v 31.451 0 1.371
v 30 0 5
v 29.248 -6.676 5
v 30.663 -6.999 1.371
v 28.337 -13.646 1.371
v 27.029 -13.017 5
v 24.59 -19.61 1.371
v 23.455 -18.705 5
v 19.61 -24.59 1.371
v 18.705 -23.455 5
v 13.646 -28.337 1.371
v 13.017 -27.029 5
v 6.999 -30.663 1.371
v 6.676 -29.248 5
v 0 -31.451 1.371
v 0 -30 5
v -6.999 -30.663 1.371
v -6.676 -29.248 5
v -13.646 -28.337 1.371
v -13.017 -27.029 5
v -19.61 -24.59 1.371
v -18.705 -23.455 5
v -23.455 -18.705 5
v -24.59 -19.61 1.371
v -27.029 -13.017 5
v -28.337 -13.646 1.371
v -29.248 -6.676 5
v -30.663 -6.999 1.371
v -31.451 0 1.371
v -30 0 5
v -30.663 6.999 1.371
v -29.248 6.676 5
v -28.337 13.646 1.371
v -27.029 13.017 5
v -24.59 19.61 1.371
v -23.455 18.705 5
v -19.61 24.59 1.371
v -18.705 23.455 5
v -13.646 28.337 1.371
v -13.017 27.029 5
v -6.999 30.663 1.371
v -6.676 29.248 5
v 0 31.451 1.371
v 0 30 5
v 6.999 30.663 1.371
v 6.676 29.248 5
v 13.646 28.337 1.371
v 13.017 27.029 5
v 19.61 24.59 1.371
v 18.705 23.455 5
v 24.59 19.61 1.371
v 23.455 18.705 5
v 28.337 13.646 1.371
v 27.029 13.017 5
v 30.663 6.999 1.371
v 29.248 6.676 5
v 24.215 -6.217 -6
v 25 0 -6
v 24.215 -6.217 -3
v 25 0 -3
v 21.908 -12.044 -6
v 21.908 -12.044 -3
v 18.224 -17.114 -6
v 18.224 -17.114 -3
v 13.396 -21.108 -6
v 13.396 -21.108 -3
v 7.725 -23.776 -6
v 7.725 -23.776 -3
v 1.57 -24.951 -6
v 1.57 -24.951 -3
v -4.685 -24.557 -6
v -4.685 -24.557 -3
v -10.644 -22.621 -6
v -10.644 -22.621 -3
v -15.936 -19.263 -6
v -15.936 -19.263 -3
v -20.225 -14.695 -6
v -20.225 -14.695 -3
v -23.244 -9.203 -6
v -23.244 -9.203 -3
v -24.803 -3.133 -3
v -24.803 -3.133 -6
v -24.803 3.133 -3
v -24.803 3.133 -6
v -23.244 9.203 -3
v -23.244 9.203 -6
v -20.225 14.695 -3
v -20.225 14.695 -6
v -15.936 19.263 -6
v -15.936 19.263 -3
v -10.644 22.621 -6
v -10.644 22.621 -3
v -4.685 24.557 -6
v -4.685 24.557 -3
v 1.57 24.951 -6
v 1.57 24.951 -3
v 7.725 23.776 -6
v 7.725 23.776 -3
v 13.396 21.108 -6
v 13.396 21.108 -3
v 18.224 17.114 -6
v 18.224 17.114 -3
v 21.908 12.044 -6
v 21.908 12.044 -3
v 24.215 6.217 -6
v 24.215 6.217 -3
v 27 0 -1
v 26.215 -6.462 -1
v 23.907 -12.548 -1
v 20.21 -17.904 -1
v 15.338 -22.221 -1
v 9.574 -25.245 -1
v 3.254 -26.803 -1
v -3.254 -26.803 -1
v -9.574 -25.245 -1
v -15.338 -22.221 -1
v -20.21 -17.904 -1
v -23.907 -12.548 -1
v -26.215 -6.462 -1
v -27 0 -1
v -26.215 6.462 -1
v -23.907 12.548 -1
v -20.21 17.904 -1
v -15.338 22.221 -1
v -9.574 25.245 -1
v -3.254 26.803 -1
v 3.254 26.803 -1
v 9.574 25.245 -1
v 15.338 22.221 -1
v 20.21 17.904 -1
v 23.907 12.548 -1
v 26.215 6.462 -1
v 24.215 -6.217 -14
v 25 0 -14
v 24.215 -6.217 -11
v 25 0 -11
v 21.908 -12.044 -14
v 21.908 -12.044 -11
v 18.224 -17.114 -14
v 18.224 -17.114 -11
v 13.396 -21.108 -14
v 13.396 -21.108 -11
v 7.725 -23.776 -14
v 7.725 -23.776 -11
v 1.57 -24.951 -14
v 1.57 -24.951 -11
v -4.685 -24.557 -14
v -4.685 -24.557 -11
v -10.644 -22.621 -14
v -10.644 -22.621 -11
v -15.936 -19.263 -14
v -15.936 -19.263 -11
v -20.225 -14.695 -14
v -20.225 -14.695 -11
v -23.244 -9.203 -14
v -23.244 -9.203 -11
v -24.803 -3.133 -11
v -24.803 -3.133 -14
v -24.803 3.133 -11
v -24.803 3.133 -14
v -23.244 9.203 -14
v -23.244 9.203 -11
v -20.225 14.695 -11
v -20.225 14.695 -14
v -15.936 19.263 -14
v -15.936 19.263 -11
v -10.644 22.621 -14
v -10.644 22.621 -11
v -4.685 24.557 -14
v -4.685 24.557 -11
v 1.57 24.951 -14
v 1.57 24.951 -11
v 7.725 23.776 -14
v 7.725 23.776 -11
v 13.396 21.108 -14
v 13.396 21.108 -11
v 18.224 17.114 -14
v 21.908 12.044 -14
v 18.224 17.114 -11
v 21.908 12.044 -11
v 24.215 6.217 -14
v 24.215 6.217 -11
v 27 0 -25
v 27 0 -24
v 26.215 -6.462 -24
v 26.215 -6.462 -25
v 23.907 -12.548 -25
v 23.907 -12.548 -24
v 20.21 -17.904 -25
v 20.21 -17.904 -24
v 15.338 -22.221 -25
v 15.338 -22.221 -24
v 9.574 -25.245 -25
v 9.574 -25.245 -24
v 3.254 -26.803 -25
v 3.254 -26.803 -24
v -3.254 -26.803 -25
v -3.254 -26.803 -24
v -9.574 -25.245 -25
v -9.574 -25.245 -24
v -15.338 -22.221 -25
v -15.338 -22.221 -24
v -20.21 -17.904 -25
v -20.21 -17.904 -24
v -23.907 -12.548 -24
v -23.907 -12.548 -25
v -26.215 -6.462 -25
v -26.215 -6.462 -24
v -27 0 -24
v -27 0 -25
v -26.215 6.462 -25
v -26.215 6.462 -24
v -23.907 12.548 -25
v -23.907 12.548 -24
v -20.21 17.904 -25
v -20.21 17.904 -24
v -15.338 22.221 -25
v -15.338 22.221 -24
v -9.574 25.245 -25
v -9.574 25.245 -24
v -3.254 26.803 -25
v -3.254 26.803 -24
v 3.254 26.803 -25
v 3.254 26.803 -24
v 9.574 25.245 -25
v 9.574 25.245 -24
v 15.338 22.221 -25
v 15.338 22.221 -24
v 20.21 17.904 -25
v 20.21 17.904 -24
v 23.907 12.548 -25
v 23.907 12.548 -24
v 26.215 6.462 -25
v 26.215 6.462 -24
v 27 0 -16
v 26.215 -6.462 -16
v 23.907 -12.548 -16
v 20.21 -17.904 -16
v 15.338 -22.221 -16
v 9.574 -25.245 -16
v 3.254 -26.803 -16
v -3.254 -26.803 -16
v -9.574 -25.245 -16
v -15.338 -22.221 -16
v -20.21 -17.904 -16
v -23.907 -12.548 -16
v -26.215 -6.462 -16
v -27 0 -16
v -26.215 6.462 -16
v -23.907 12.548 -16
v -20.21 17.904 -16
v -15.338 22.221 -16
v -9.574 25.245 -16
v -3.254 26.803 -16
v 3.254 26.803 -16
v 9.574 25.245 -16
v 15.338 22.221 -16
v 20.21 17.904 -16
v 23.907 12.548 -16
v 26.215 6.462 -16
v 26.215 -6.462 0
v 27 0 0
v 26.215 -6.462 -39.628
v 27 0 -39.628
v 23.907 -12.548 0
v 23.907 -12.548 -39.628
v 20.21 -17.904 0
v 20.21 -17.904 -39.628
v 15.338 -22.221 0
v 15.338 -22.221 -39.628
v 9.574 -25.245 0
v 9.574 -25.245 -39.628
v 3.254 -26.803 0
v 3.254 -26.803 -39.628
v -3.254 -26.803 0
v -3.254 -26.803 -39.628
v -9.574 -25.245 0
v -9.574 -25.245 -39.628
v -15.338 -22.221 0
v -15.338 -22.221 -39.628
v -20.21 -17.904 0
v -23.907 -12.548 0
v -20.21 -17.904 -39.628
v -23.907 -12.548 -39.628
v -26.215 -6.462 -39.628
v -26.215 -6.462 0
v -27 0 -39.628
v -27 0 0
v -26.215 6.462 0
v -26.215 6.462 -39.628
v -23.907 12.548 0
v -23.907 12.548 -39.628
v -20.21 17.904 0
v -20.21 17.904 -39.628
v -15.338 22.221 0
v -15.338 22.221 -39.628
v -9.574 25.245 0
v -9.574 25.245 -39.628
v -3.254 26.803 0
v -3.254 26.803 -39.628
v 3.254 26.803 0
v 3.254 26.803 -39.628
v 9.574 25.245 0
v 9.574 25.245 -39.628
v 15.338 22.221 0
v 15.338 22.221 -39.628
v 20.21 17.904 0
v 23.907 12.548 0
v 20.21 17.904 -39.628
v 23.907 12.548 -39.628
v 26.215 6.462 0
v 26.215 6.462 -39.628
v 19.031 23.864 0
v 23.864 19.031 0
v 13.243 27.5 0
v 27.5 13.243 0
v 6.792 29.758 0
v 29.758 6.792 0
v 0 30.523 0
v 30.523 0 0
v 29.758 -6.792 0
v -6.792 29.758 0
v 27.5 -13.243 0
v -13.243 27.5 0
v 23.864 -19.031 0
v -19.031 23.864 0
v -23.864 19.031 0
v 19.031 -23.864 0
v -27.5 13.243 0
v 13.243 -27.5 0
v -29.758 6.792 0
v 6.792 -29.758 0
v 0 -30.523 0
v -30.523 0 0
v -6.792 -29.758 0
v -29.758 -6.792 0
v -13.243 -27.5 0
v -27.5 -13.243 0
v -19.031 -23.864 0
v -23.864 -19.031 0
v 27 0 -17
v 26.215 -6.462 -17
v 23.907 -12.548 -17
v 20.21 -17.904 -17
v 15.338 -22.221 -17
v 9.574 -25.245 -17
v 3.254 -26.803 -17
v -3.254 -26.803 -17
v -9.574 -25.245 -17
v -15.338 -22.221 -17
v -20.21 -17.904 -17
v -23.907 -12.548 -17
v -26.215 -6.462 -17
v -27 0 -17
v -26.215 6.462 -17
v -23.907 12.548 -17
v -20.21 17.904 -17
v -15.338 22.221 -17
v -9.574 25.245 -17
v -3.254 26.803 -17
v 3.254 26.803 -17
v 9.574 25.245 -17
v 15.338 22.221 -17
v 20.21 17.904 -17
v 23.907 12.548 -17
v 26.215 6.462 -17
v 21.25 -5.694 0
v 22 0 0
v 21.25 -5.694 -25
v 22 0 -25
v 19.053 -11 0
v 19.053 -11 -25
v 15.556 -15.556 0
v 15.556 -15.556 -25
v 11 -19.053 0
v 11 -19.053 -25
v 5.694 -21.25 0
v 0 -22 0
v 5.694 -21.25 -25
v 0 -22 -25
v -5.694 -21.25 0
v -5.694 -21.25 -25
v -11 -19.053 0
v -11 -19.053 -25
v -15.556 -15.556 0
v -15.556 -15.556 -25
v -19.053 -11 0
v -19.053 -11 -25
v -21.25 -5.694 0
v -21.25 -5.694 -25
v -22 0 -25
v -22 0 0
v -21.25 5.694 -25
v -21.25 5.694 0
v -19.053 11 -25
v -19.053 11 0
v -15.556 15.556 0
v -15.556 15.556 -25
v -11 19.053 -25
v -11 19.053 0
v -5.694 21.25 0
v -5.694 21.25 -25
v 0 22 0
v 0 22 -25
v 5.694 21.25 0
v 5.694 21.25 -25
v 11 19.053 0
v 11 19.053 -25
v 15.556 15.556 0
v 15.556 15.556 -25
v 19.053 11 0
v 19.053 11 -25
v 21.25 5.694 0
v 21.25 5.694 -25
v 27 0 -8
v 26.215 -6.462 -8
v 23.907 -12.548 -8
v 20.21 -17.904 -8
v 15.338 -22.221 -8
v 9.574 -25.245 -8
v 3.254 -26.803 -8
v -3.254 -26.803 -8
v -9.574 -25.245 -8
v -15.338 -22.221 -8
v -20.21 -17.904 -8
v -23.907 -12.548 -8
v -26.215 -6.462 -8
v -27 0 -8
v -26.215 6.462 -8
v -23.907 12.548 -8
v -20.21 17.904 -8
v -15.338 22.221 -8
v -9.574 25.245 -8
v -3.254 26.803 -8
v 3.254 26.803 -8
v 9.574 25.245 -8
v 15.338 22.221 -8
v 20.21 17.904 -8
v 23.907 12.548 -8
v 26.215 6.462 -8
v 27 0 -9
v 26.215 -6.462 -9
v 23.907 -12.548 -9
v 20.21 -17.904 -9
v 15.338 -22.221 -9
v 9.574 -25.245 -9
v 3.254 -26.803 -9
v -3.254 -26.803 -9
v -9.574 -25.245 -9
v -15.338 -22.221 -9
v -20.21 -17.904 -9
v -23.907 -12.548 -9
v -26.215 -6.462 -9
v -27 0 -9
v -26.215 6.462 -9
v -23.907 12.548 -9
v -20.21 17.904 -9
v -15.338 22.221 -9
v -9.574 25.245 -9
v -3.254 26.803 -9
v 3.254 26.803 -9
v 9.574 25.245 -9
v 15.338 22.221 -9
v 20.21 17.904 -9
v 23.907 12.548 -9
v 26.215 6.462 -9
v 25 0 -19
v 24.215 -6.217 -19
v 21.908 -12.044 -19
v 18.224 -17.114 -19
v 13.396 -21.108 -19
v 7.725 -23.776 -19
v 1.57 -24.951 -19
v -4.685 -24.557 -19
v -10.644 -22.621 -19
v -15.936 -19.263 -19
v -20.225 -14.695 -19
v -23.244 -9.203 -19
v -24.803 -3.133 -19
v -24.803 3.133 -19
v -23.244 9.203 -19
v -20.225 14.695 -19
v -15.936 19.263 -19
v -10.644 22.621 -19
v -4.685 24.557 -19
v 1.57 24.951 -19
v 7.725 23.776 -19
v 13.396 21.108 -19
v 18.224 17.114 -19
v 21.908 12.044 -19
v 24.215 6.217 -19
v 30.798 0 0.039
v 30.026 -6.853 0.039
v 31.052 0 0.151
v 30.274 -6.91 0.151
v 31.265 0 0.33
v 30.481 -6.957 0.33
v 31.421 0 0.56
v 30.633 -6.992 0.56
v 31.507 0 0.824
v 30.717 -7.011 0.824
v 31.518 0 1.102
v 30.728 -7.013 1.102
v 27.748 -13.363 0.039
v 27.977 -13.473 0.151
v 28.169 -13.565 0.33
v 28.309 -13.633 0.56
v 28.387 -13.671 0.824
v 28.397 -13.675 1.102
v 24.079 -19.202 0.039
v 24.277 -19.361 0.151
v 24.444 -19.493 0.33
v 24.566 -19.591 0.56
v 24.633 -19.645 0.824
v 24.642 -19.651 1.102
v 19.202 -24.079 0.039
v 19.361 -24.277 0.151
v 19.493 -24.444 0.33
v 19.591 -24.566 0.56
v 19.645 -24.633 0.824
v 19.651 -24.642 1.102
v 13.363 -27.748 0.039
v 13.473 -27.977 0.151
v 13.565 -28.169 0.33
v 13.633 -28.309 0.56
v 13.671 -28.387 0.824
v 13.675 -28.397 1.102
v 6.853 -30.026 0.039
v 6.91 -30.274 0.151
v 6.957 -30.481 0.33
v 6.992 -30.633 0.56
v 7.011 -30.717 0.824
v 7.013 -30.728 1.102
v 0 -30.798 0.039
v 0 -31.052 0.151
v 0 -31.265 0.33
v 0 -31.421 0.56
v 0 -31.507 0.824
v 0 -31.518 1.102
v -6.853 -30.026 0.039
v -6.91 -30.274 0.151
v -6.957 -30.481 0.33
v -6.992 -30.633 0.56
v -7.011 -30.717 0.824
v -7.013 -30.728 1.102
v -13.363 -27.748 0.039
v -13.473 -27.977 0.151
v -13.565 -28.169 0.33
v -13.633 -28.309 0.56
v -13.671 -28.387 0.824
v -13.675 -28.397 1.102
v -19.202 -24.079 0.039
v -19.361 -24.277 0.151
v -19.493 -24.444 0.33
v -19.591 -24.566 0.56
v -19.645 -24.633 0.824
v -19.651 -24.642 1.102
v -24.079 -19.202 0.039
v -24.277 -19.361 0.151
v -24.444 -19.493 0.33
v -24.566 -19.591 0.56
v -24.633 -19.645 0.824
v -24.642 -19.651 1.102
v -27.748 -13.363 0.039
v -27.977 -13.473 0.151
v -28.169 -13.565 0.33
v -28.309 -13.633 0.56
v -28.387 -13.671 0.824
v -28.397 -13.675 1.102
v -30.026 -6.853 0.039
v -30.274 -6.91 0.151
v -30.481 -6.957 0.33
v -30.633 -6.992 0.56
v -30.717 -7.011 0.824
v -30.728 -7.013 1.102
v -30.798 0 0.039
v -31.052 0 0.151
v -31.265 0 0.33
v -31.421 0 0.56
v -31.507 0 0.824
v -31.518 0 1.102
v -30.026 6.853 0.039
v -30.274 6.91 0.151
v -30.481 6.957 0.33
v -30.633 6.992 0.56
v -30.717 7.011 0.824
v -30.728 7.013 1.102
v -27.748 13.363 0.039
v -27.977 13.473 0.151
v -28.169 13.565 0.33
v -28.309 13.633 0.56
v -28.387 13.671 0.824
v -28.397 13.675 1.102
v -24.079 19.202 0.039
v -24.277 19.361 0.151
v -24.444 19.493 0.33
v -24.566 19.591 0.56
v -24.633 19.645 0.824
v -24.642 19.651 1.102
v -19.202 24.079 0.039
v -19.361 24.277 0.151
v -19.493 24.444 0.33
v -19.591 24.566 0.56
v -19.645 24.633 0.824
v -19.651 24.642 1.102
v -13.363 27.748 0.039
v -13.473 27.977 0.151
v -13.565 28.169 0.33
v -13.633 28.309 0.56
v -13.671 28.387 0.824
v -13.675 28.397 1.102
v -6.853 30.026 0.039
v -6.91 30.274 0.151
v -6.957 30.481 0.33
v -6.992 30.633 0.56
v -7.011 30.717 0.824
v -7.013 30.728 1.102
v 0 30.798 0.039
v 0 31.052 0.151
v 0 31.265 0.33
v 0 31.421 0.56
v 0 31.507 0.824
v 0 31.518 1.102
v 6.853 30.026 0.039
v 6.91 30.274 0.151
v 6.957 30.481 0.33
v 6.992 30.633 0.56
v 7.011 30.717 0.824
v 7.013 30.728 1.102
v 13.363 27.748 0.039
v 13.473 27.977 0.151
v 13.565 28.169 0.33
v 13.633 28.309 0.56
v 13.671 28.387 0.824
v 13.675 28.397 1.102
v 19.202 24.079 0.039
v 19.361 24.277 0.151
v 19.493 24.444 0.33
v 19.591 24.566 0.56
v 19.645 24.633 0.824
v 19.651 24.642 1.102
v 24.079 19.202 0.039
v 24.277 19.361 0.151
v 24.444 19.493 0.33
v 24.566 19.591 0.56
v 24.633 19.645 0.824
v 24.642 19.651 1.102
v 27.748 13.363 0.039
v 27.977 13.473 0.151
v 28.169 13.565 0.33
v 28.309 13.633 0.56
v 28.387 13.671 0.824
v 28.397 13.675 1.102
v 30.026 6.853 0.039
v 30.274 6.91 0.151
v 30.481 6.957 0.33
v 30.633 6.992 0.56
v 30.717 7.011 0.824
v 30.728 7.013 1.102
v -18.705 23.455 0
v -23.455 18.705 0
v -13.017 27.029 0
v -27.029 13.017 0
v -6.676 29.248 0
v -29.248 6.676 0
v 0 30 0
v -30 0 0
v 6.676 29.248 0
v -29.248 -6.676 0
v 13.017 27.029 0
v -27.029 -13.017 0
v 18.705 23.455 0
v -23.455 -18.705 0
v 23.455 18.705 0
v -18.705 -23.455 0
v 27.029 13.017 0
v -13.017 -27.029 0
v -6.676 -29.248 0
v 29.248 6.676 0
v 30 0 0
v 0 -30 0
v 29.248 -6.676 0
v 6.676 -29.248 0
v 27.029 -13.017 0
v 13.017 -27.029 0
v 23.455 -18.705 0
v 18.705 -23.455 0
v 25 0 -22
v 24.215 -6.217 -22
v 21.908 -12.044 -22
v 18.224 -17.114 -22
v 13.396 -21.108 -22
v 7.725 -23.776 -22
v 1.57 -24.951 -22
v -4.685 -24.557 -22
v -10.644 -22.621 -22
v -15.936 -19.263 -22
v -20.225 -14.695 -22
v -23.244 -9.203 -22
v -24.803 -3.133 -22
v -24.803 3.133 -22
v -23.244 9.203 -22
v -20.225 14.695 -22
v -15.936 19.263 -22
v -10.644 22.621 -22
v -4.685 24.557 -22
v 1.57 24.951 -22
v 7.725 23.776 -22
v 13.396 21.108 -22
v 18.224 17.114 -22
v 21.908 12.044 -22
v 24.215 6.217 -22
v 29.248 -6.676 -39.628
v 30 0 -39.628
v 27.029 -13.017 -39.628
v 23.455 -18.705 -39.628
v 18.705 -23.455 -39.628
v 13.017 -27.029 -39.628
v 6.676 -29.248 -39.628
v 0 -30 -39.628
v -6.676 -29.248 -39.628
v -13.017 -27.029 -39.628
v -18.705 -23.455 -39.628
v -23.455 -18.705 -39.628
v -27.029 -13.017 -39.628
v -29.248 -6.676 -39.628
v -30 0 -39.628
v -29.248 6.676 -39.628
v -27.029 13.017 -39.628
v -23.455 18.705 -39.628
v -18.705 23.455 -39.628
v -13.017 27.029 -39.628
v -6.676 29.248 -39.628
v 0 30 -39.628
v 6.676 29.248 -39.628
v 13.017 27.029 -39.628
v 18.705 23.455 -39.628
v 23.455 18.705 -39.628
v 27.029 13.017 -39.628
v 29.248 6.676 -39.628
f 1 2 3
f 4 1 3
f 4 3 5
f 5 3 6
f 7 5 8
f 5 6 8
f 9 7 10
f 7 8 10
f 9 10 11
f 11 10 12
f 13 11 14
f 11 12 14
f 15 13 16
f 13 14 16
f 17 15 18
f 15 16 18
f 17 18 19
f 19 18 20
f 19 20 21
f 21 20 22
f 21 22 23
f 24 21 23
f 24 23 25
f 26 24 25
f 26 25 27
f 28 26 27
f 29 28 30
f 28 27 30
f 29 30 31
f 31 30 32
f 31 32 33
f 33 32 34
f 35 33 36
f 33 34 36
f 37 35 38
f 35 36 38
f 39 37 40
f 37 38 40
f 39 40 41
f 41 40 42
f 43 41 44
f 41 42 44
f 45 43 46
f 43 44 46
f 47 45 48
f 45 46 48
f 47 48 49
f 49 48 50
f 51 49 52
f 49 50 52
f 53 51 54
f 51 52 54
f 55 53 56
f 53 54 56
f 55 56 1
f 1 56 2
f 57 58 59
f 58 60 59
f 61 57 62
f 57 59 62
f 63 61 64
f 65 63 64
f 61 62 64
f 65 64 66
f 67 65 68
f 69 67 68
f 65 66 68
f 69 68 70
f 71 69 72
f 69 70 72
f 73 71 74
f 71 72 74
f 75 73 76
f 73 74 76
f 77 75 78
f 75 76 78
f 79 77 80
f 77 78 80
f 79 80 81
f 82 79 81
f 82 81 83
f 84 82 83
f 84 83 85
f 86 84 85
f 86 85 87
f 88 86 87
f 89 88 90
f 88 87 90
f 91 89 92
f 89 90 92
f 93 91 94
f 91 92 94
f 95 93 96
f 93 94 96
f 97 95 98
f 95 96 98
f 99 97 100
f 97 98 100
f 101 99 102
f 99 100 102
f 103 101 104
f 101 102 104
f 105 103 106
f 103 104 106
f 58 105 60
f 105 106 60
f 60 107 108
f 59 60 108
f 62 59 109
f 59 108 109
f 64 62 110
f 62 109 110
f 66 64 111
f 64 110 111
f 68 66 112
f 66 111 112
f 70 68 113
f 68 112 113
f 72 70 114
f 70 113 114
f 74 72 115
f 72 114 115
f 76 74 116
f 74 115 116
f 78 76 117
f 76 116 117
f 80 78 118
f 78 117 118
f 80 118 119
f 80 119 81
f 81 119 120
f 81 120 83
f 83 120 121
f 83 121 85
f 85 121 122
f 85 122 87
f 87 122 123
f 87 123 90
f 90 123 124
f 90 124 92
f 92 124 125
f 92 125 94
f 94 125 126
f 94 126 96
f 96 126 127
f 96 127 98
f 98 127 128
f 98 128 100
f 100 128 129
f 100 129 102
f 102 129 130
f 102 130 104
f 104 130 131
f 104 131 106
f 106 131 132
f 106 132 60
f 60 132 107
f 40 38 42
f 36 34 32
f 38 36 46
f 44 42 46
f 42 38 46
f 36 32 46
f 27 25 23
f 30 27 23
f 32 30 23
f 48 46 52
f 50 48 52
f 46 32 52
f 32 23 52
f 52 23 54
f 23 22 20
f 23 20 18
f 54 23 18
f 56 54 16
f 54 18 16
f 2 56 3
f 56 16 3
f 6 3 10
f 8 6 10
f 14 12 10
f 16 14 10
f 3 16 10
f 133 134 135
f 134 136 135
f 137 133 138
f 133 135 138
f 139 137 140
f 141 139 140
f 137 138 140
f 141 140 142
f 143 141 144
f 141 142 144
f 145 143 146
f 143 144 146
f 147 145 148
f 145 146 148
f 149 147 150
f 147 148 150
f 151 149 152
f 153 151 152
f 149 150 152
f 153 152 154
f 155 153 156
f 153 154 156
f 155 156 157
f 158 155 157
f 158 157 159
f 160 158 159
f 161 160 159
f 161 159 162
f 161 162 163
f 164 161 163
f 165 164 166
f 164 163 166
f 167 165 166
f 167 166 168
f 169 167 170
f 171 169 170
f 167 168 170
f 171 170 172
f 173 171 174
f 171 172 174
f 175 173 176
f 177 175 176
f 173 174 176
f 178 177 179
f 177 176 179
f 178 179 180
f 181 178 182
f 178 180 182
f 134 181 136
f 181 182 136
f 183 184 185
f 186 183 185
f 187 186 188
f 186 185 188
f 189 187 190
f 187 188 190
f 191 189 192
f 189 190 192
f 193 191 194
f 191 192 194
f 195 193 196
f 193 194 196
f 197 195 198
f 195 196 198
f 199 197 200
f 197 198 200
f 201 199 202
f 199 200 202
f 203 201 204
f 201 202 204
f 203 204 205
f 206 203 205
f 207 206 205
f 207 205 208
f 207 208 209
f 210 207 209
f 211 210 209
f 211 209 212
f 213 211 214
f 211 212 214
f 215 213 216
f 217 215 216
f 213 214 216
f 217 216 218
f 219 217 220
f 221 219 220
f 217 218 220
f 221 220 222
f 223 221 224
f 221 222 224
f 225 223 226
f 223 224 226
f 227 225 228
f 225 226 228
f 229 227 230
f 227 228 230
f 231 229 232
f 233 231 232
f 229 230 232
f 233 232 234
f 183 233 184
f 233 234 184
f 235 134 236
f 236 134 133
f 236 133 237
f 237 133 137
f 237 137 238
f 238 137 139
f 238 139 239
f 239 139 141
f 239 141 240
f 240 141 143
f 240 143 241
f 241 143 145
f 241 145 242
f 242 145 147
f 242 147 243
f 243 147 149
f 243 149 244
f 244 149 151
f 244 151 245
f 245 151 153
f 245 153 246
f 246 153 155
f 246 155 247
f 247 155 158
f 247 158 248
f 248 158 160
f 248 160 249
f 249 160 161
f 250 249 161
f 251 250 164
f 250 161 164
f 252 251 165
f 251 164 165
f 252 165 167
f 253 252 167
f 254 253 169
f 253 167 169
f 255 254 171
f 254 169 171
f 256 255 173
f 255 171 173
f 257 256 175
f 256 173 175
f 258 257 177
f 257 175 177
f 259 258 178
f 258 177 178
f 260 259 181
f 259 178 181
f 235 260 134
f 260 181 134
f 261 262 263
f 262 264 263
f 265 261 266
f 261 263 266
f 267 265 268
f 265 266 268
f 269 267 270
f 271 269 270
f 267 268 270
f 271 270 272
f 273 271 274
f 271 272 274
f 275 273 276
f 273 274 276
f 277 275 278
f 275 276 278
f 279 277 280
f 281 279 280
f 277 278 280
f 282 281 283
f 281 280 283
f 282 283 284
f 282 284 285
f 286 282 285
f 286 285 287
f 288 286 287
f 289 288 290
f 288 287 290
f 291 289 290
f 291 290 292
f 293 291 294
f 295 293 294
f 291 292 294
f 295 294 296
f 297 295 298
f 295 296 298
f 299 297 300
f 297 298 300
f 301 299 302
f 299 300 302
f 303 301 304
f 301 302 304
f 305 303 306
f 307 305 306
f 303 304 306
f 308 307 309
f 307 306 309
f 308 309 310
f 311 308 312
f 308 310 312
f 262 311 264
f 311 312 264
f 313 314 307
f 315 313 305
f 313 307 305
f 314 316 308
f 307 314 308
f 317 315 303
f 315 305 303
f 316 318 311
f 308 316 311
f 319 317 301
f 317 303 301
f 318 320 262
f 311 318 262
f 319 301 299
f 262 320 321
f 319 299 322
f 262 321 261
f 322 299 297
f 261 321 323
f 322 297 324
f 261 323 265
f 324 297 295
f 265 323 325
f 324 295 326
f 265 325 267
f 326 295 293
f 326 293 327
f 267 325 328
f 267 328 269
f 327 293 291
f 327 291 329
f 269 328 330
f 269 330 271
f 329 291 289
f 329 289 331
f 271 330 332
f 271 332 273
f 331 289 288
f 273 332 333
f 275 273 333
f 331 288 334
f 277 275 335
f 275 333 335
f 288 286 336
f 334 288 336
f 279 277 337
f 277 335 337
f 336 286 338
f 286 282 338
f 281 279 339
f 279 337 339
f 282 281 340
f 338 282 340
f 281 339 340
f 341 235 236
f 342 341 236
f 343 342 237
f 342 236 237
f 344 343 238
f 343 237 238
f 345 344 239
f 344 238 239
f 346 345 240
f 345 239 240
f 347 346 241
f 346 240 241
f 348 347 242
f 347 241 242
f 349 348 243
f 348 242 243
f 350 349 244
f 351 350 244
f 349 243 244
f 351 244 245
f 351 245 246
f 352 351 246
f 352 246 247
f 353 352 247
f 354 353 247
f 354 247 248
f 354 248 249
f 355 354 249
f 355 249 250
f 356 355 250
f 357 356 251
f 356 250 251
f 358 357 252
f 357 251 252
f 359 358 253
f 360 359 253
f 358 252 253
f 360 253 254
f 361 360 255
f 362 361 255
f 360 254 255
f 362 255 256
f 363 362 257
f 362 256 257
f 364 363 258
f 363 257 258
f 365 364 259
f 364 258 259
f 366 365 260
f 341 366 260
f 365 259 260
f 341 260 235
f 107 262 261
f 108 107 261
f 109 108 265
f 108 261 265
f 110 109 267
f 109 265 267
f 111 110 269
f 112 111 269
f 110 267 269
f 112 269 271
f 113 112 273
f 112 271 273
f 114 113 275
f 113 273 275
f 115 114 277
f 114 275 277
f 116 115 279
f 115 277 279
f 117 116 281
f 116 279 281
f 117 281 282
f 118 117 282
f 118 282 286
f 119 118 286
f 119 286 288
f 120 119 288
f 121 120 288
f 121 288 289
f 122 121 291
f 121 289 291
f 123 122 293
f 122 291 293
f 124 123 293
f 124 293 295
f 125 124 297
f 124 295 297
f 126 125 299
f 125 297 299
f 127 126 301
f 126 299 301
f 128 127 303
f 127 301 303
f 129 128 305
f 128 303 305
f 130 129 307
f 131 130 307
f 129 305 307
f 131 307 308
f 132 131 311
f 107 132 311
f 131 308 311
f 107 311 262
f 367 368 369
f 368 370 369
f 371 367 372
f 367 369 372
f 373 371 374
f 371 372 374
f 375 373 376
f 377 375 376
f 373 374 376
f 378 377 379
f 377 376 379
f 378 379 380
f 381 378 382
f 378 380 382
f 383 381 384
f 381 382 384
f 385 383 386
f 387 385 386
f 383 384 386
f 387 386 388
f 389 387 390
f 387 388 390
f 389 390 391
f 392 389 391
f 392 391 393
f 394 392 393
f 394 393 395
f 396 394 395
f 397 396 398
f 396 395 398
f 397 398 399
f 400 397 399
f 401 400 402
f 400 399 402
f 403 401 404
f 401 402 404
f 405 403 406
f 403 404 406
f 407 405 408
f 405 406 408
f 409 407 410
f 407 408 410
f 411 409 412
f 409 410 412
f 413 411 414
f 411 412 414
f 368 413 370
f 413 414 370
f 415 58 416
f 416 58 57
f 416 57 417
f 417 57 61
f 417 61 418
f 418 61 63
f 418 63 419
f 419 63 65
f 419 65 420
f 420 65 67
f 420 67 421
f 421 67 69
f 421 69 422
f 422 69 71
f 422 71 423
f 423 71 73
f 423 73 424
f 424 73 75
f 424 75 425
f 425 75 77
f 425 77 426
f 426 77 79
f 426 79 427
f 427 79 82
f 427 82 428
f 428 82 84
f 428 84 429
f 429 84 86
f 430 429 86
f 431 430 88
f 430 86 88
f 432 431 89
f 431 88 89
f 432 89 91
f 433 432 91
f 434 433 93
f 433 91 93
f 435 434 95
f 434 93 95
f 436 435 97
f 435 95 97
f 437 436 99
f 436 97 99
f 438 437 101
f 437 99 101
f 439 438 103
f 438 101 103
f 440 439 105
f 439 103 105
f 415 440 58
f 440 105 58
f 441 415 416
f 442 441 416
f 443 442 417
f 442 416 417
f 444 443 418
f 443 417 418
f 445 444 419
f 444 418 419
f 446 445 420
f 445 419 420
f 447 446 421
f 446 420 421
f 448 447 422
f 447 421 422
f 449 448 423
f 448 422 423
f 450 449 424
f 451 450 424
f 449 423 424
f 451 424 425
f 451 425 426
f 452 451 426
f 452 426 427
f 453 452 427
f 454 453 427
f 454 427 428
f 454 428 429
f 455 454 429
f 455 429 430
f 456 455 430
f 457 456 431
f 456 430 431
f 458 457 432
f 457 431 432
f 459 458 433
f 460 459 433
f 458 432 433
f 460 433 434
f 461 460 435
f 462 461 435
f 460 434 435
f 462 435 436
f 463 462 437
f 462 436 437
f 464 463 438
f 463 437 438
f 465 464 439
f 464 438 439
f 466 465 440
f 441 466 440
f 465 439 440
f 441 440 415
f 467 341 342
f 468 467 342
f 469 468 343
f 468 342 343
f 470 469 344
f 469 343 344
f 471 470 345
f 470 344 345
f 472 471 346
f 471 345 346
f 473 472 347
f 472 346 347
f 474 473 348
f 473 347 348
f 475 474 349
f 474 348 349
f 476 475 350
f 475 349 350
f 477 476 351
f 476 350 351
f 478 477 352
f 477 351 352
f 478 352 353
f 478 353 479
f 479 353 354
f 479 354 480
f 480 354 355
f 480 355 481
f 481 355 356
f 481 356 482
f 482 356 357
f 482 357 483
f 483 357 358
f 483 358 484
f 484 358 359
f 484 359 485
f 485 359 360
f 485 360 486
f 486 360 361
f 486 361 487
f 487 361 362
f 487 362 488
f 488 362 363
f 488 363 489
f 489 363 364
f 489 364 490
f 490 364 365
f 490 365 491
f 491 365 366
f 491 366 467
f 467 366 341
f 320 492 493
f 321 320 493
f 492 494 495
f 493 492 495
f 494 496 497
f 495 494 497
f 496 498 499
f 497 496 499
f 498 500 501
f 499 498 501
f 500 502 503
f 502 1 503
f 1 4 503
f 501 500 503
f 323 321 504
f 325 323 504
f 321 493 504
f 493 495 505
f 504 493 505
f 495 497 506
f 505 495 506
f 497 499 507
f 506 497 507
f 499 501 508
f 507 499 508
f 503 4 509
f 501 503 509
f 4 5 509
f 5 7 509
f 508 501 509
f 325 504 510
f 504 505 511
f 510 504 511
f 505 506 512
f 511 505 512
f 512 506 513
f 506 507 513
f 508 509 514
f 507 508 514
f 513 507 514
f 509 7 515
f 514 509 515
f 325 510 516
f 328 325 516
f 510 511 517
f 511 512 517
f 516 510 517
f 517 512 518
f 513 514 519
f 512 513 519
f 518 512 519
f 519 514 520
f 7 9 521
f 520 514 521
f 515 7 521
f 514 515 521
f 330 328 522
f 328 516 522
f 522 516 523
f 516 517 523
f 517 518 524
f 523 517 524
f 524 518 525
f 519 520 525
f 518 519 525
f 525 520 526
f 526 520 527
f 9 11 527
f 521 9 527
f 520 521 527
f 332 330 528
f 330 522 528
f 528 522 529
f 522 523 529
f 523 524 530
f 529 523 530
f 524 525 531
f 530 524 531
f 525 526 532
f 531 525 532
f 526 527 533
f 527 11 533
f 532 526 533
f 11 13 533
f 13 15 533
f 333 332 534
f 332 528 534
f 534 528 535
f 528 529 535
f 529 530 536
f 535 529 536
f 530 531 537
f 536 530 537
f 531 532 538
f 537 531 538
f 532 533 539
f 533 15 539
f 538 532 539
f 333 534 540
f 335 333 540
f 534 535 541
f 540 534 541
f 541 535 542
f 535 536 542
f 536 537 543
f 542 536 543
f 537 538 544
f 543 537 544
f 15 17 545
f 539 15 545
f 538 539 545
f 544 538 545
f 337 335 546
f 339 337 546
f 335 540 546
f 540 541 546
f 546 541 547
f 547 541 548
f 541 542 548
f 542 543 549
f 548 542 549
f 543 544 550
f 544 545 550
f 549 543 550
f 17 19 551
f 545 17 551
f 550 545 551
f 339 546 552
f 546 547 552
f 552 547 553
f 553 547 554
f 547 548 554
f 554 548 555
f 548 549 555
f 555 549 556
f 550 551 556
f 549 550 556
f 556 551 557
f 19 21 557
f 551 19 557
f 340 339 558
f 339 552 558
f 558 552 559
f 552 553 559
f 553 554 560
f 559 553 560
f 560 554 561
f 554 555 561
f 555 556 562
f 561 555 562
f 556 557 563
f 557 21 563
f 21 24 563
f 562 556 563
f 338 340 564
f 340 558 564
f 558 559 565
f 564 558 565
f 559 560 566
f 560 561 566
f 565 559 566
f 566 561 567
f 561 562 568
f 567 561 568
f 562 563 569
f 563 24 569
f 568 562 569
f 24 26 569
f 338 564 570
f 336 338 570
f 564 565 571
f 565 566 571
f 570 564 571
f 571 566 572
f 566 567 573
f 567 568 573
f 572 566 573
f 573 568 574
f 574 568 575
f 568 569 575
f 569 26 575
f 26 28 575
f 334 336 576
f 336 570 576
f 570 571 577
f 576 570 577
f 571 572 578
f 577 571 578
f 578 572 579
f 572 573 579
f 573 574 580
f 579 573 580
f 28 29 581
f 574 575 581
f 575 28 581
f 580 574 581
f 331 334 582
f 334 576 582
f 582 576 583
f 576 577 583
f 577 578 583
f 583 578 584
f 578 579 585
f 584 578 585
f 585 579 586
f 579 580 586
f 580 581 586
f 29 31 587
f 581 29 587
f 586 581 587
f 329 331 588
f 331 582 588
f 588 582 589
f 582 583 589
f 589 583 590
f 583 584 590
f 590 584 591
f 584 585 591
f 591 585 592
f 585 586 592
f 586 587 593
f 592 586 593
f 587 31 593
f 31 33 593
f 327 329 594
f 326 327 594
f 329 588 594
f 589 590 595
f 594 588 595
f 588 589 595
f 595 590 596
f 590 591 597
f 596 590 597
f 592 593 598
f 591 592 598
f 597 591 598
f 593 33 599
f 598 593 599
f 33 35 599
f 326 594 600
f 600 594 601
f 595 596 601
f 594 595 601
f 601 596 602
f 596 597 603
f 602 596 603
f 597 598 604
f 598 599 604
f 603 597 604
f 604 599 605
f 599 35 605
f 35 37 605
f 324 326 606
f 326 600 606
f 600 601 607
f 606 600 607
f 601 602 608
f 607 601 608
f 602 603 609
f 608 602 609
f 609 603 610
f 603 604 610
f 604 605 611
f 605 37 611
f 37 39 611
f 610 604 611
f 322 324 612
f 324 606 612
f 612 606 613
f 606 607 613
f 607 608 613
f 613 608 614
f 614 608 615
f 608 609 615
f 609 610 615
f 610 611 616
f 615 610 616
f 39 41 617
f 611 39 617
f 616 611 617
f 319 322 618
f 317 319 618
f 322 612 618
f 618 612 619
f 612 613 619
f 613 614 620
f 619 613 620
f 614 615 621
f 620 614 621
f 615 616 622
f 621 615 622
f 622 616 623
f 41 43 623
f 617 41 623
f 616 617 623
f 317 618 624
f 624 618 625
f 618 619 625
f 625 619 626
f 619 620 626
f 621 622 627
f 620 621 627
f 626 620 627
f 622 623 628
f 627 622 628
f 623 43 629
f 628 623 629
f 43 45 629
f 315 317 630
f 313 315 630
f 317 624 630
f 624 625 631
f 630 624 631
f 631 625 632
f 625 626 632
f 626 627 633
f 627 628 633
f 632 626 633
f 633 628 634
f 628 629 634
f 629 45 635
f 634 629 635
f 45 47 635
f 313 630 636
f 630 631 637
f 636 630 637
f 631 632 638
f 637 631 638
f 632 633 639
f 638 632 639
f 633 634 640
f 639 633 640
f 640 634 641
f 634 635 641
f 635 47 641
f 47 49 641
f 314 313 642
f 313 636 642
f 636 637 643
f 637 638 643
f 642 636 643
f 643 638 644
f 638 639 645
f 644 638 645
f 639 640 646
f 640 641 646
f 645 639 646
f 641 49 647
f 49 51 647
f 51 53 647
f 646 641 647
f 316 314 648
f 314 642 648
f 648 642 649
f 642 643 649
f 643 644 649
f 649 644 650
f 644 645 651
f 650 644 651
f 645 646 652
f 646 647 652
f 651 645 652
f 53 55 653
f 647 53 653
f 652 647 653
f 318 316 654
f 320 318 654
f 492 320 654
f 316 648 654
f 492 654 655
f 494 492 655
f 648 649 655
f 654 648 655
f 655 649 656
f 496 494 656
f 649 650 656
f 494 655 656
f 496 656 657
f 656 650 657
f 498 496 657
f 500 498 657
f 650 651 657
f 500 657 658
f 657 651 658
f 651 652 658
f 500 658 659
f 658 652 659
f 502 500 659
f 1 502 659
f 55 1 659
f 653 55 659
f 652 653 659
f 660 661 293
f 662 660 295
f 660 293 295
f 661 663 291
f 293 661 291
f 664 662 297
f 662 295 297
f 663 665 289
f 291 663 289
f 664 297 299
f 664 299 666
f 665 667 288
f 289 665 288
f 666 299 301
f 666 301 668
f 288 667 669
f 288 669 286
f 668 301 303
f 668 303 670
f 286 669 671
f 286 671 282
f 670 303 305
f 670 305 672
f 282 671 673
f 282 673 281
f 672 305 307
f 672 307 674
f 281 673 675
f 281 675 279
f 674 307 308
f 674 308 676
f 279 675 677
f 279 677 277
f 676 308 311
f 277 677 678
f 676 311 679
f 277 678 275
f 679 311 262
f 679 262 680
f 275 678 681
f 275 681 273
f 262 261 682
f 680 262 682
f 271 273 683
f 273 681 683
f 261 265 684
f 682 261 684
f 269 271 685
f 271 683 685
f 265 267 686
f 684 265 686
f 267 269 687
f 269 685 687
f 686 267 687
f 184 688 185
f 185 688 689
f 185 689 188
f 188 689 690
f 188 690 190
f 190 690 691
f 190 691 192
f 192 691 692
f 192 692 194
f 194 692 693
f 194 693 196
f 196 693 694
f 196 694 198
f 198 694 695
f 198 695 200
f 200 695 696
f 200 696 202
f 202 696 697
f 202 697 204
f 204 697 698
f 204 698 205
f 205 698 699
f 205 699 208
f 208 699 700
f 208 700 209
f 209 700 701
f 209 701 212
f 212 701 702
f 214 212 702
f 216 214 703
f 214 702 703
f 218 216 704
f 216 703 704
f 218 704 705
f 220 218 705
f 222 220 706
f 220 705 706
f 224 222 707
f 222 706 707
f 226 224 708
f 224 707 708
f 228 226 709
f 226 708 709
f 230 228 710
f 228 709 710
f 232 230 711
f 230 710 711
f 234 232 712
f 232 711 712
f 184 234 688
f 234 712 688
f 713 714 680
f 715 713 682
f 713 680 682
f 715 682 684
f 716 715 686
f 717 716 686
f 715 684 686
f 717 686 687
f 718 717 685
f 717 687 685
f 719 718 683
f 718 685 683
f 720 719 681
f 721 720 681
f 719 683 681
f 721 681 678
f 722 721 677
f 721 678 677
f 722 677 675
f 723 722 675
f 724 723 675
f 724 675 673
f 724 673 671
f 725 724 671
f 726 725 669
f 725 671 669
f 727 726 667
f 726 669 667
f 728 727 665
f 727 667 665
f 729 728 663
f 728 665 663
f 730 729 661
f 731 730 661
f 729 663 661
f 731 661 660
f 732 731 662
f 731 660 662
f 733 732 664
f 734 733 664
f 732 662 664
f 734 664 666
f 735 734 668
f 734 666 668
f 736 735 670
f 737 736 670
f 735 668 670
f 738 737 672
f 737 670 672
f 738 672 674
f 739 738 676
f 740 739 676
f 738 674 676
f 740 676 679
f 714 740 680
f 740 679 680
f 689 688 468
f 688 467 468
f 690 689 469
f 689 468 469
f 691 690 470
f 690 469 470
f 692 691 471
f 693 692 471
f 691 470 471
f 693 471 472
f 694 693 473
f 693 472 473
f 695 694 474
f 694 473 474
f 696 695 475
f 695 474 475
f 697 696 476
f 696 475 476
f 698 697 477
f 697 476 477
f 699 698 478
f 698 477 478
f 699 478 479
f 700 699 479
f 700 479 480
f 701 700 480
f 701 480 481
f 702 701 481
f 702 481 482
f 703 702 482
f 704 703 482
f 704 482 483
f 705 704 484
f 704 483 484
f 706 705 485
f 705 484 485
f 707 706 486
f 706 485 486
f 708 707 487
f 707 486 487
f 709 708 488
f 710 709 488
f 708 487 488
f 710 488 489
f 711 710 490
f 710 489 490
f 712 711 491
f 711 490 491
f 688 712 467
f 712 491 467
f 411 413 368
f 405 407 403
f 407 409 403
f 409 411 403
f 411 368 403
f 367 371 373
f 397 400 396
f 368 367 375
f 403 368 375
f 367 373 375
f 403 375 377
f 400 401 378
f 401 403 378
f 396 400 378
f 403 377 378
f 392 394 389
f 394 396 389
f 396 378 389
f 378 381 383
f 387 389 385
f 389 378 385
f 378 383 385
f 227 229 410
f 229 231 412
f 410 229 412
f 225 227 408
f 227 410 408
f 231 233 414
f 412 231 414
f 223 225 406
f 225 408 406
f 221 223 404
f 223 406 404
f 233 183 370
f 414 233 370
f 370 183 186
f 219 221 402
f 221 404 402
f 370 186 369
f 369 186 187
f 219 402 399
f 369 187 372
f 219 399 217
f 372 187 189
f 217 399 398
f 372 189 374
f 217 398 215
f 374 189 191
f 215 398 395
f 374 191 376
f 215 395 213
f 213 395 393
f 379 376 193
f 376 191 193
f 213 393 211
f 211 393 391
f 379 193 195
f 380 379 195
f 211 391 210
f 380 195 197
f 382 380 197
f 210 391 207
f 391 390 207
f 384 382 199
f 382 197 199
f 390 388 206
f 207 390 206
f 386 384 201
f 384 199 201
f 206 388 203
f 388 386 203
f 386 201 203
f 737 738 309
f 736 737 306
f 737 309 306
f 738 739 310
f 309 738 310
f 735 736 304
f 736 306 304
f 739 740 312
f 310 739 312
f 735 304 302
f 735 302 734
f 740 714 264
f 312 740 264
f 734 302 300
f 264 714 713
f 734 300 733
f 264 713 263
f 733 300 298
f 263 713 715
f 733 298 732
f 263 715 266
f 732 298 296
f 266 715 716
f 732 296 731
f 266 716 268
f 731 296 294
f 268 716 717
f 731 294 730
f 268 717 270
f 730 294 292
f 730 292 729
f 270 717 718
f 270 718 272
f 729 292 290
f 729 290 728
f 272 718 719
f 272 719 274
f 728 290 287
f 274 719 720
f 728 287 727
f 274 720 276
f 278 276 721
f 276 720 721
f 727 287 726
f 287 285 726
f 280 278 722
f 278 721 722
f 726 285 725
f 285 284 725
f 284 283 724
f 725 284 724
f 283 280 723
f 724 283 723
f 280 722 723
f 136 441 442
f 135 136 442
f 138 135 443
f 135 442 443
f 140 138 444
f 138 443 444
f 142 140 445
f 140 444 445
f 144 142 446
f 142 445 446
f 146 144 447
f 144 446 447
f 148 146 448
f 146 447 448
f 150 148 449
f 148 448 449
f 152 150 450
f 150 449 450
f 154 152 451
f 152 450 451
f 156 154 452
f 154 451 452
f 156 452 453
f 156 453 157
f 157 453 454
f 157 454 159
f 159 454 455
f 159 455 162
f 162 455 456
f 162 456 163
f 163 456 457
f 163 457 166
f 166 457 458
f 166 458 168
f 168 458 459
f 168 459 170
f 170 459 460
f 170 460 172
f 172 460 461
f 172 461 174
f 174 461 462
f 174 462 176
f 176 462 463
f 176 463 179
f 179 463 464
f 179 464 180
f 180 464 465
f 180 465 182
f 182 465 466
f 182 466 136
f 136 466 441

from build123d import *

# Parameters (mm, degrees)
F0_W    = 2
F0_H    = 5
F0_H_2  = 3
F3_SIZE = 1.99999
F5_R    = 1


# Not quite as in the source:
# - a fillet or chamfer that OpenCascade refuses, or shapes differently, is made with other operations: its cross-section is extruded or revolved along the edge and cut away or added
# - a fillet or chamfer is up to 0.001 mm smaller than in the source, because OpenCascade refuses the exact size


with BuildPart() as f1:
    # F0 (on Front) → F1 (revolve)
    with BuildSketch(Plane.XZ):
        Polygon((30, 0), (27, 0), (27, -3), (27, -6), (27, -11), (27, -14), (27, -19), (27, -22), (27, -25), (27, -39.6280139685), (30, -39.6280139685), align=None)
    revolve(axis=Axis((0, 0, -12.5), (0, 0, -1)))


with BuildPart() as f2:
    # F0 (on Front) → F2 (revolve)
    with BuildSketch(Plane.XZ):
        Polygon((0, 5), (0, 0), (22, 0), (25, 0), (27, 0), (30, 0), (30, 5), align=None)
        with Locations((31, 2.5)):
            Rectangle(F0_W, F0_H)
        Polygon((25, 0), (22, 0), (22, -25), (25, -25), (25, -22), (25, -19), (25, -14), (25, -11), (25, -6), (25, -3), align=None)
        with Locations((26, -1.5)):
            Rectangle(F0_W, F0_H_2)
        with Locations((26, -8.5)):
            Rectangle(F0_W, F0_H)
        with Locations((26, -16.5)):
            Rectangle(F0_W, F0_H)
        with Locations((26, -23.5)):
            Rectangle(F0_W, F0_H_2)
    revolve(axis=Axis((0, 0, -12.5), (0, 0, -1)))

    # F3 (size 2 in the source; OpenCascade refuses exactly that, so slightly less here)
    f3_edges = [f2.edges().sort_by_distance(p)[0] for p in [
        (-27, 0, -22),
        (-27, 0, -19),
        (-27, 0, -14),
        (-27, 0, -6),
        (-27, 0, -11),
        (-27, 0, -3),
    ]]
    chamfer(f3_edges, length=F3_SIZE)

    # F4: chamfer of 2 x 5 on 1 edges, made by hand

    # F4_s1 → F4_t2 (revolve, cut)
    with BuildSketch(Plane.XZ):
        Polygon((32, 0), (30, 5), (32, 5), align=None)
    revolve(axis=Axis((0, 0, 5), (0, 0, -1)), mode=Mode.SUBTRACT)

    # F5
    f5_edges = [f2.edges().sort_by_distance(p)[0] for p in [
        (-32, 0, 0),
    ]]
    fillet(f5_edges, radius=F5_R)


solid = Compound([f1.part, f2.part])
